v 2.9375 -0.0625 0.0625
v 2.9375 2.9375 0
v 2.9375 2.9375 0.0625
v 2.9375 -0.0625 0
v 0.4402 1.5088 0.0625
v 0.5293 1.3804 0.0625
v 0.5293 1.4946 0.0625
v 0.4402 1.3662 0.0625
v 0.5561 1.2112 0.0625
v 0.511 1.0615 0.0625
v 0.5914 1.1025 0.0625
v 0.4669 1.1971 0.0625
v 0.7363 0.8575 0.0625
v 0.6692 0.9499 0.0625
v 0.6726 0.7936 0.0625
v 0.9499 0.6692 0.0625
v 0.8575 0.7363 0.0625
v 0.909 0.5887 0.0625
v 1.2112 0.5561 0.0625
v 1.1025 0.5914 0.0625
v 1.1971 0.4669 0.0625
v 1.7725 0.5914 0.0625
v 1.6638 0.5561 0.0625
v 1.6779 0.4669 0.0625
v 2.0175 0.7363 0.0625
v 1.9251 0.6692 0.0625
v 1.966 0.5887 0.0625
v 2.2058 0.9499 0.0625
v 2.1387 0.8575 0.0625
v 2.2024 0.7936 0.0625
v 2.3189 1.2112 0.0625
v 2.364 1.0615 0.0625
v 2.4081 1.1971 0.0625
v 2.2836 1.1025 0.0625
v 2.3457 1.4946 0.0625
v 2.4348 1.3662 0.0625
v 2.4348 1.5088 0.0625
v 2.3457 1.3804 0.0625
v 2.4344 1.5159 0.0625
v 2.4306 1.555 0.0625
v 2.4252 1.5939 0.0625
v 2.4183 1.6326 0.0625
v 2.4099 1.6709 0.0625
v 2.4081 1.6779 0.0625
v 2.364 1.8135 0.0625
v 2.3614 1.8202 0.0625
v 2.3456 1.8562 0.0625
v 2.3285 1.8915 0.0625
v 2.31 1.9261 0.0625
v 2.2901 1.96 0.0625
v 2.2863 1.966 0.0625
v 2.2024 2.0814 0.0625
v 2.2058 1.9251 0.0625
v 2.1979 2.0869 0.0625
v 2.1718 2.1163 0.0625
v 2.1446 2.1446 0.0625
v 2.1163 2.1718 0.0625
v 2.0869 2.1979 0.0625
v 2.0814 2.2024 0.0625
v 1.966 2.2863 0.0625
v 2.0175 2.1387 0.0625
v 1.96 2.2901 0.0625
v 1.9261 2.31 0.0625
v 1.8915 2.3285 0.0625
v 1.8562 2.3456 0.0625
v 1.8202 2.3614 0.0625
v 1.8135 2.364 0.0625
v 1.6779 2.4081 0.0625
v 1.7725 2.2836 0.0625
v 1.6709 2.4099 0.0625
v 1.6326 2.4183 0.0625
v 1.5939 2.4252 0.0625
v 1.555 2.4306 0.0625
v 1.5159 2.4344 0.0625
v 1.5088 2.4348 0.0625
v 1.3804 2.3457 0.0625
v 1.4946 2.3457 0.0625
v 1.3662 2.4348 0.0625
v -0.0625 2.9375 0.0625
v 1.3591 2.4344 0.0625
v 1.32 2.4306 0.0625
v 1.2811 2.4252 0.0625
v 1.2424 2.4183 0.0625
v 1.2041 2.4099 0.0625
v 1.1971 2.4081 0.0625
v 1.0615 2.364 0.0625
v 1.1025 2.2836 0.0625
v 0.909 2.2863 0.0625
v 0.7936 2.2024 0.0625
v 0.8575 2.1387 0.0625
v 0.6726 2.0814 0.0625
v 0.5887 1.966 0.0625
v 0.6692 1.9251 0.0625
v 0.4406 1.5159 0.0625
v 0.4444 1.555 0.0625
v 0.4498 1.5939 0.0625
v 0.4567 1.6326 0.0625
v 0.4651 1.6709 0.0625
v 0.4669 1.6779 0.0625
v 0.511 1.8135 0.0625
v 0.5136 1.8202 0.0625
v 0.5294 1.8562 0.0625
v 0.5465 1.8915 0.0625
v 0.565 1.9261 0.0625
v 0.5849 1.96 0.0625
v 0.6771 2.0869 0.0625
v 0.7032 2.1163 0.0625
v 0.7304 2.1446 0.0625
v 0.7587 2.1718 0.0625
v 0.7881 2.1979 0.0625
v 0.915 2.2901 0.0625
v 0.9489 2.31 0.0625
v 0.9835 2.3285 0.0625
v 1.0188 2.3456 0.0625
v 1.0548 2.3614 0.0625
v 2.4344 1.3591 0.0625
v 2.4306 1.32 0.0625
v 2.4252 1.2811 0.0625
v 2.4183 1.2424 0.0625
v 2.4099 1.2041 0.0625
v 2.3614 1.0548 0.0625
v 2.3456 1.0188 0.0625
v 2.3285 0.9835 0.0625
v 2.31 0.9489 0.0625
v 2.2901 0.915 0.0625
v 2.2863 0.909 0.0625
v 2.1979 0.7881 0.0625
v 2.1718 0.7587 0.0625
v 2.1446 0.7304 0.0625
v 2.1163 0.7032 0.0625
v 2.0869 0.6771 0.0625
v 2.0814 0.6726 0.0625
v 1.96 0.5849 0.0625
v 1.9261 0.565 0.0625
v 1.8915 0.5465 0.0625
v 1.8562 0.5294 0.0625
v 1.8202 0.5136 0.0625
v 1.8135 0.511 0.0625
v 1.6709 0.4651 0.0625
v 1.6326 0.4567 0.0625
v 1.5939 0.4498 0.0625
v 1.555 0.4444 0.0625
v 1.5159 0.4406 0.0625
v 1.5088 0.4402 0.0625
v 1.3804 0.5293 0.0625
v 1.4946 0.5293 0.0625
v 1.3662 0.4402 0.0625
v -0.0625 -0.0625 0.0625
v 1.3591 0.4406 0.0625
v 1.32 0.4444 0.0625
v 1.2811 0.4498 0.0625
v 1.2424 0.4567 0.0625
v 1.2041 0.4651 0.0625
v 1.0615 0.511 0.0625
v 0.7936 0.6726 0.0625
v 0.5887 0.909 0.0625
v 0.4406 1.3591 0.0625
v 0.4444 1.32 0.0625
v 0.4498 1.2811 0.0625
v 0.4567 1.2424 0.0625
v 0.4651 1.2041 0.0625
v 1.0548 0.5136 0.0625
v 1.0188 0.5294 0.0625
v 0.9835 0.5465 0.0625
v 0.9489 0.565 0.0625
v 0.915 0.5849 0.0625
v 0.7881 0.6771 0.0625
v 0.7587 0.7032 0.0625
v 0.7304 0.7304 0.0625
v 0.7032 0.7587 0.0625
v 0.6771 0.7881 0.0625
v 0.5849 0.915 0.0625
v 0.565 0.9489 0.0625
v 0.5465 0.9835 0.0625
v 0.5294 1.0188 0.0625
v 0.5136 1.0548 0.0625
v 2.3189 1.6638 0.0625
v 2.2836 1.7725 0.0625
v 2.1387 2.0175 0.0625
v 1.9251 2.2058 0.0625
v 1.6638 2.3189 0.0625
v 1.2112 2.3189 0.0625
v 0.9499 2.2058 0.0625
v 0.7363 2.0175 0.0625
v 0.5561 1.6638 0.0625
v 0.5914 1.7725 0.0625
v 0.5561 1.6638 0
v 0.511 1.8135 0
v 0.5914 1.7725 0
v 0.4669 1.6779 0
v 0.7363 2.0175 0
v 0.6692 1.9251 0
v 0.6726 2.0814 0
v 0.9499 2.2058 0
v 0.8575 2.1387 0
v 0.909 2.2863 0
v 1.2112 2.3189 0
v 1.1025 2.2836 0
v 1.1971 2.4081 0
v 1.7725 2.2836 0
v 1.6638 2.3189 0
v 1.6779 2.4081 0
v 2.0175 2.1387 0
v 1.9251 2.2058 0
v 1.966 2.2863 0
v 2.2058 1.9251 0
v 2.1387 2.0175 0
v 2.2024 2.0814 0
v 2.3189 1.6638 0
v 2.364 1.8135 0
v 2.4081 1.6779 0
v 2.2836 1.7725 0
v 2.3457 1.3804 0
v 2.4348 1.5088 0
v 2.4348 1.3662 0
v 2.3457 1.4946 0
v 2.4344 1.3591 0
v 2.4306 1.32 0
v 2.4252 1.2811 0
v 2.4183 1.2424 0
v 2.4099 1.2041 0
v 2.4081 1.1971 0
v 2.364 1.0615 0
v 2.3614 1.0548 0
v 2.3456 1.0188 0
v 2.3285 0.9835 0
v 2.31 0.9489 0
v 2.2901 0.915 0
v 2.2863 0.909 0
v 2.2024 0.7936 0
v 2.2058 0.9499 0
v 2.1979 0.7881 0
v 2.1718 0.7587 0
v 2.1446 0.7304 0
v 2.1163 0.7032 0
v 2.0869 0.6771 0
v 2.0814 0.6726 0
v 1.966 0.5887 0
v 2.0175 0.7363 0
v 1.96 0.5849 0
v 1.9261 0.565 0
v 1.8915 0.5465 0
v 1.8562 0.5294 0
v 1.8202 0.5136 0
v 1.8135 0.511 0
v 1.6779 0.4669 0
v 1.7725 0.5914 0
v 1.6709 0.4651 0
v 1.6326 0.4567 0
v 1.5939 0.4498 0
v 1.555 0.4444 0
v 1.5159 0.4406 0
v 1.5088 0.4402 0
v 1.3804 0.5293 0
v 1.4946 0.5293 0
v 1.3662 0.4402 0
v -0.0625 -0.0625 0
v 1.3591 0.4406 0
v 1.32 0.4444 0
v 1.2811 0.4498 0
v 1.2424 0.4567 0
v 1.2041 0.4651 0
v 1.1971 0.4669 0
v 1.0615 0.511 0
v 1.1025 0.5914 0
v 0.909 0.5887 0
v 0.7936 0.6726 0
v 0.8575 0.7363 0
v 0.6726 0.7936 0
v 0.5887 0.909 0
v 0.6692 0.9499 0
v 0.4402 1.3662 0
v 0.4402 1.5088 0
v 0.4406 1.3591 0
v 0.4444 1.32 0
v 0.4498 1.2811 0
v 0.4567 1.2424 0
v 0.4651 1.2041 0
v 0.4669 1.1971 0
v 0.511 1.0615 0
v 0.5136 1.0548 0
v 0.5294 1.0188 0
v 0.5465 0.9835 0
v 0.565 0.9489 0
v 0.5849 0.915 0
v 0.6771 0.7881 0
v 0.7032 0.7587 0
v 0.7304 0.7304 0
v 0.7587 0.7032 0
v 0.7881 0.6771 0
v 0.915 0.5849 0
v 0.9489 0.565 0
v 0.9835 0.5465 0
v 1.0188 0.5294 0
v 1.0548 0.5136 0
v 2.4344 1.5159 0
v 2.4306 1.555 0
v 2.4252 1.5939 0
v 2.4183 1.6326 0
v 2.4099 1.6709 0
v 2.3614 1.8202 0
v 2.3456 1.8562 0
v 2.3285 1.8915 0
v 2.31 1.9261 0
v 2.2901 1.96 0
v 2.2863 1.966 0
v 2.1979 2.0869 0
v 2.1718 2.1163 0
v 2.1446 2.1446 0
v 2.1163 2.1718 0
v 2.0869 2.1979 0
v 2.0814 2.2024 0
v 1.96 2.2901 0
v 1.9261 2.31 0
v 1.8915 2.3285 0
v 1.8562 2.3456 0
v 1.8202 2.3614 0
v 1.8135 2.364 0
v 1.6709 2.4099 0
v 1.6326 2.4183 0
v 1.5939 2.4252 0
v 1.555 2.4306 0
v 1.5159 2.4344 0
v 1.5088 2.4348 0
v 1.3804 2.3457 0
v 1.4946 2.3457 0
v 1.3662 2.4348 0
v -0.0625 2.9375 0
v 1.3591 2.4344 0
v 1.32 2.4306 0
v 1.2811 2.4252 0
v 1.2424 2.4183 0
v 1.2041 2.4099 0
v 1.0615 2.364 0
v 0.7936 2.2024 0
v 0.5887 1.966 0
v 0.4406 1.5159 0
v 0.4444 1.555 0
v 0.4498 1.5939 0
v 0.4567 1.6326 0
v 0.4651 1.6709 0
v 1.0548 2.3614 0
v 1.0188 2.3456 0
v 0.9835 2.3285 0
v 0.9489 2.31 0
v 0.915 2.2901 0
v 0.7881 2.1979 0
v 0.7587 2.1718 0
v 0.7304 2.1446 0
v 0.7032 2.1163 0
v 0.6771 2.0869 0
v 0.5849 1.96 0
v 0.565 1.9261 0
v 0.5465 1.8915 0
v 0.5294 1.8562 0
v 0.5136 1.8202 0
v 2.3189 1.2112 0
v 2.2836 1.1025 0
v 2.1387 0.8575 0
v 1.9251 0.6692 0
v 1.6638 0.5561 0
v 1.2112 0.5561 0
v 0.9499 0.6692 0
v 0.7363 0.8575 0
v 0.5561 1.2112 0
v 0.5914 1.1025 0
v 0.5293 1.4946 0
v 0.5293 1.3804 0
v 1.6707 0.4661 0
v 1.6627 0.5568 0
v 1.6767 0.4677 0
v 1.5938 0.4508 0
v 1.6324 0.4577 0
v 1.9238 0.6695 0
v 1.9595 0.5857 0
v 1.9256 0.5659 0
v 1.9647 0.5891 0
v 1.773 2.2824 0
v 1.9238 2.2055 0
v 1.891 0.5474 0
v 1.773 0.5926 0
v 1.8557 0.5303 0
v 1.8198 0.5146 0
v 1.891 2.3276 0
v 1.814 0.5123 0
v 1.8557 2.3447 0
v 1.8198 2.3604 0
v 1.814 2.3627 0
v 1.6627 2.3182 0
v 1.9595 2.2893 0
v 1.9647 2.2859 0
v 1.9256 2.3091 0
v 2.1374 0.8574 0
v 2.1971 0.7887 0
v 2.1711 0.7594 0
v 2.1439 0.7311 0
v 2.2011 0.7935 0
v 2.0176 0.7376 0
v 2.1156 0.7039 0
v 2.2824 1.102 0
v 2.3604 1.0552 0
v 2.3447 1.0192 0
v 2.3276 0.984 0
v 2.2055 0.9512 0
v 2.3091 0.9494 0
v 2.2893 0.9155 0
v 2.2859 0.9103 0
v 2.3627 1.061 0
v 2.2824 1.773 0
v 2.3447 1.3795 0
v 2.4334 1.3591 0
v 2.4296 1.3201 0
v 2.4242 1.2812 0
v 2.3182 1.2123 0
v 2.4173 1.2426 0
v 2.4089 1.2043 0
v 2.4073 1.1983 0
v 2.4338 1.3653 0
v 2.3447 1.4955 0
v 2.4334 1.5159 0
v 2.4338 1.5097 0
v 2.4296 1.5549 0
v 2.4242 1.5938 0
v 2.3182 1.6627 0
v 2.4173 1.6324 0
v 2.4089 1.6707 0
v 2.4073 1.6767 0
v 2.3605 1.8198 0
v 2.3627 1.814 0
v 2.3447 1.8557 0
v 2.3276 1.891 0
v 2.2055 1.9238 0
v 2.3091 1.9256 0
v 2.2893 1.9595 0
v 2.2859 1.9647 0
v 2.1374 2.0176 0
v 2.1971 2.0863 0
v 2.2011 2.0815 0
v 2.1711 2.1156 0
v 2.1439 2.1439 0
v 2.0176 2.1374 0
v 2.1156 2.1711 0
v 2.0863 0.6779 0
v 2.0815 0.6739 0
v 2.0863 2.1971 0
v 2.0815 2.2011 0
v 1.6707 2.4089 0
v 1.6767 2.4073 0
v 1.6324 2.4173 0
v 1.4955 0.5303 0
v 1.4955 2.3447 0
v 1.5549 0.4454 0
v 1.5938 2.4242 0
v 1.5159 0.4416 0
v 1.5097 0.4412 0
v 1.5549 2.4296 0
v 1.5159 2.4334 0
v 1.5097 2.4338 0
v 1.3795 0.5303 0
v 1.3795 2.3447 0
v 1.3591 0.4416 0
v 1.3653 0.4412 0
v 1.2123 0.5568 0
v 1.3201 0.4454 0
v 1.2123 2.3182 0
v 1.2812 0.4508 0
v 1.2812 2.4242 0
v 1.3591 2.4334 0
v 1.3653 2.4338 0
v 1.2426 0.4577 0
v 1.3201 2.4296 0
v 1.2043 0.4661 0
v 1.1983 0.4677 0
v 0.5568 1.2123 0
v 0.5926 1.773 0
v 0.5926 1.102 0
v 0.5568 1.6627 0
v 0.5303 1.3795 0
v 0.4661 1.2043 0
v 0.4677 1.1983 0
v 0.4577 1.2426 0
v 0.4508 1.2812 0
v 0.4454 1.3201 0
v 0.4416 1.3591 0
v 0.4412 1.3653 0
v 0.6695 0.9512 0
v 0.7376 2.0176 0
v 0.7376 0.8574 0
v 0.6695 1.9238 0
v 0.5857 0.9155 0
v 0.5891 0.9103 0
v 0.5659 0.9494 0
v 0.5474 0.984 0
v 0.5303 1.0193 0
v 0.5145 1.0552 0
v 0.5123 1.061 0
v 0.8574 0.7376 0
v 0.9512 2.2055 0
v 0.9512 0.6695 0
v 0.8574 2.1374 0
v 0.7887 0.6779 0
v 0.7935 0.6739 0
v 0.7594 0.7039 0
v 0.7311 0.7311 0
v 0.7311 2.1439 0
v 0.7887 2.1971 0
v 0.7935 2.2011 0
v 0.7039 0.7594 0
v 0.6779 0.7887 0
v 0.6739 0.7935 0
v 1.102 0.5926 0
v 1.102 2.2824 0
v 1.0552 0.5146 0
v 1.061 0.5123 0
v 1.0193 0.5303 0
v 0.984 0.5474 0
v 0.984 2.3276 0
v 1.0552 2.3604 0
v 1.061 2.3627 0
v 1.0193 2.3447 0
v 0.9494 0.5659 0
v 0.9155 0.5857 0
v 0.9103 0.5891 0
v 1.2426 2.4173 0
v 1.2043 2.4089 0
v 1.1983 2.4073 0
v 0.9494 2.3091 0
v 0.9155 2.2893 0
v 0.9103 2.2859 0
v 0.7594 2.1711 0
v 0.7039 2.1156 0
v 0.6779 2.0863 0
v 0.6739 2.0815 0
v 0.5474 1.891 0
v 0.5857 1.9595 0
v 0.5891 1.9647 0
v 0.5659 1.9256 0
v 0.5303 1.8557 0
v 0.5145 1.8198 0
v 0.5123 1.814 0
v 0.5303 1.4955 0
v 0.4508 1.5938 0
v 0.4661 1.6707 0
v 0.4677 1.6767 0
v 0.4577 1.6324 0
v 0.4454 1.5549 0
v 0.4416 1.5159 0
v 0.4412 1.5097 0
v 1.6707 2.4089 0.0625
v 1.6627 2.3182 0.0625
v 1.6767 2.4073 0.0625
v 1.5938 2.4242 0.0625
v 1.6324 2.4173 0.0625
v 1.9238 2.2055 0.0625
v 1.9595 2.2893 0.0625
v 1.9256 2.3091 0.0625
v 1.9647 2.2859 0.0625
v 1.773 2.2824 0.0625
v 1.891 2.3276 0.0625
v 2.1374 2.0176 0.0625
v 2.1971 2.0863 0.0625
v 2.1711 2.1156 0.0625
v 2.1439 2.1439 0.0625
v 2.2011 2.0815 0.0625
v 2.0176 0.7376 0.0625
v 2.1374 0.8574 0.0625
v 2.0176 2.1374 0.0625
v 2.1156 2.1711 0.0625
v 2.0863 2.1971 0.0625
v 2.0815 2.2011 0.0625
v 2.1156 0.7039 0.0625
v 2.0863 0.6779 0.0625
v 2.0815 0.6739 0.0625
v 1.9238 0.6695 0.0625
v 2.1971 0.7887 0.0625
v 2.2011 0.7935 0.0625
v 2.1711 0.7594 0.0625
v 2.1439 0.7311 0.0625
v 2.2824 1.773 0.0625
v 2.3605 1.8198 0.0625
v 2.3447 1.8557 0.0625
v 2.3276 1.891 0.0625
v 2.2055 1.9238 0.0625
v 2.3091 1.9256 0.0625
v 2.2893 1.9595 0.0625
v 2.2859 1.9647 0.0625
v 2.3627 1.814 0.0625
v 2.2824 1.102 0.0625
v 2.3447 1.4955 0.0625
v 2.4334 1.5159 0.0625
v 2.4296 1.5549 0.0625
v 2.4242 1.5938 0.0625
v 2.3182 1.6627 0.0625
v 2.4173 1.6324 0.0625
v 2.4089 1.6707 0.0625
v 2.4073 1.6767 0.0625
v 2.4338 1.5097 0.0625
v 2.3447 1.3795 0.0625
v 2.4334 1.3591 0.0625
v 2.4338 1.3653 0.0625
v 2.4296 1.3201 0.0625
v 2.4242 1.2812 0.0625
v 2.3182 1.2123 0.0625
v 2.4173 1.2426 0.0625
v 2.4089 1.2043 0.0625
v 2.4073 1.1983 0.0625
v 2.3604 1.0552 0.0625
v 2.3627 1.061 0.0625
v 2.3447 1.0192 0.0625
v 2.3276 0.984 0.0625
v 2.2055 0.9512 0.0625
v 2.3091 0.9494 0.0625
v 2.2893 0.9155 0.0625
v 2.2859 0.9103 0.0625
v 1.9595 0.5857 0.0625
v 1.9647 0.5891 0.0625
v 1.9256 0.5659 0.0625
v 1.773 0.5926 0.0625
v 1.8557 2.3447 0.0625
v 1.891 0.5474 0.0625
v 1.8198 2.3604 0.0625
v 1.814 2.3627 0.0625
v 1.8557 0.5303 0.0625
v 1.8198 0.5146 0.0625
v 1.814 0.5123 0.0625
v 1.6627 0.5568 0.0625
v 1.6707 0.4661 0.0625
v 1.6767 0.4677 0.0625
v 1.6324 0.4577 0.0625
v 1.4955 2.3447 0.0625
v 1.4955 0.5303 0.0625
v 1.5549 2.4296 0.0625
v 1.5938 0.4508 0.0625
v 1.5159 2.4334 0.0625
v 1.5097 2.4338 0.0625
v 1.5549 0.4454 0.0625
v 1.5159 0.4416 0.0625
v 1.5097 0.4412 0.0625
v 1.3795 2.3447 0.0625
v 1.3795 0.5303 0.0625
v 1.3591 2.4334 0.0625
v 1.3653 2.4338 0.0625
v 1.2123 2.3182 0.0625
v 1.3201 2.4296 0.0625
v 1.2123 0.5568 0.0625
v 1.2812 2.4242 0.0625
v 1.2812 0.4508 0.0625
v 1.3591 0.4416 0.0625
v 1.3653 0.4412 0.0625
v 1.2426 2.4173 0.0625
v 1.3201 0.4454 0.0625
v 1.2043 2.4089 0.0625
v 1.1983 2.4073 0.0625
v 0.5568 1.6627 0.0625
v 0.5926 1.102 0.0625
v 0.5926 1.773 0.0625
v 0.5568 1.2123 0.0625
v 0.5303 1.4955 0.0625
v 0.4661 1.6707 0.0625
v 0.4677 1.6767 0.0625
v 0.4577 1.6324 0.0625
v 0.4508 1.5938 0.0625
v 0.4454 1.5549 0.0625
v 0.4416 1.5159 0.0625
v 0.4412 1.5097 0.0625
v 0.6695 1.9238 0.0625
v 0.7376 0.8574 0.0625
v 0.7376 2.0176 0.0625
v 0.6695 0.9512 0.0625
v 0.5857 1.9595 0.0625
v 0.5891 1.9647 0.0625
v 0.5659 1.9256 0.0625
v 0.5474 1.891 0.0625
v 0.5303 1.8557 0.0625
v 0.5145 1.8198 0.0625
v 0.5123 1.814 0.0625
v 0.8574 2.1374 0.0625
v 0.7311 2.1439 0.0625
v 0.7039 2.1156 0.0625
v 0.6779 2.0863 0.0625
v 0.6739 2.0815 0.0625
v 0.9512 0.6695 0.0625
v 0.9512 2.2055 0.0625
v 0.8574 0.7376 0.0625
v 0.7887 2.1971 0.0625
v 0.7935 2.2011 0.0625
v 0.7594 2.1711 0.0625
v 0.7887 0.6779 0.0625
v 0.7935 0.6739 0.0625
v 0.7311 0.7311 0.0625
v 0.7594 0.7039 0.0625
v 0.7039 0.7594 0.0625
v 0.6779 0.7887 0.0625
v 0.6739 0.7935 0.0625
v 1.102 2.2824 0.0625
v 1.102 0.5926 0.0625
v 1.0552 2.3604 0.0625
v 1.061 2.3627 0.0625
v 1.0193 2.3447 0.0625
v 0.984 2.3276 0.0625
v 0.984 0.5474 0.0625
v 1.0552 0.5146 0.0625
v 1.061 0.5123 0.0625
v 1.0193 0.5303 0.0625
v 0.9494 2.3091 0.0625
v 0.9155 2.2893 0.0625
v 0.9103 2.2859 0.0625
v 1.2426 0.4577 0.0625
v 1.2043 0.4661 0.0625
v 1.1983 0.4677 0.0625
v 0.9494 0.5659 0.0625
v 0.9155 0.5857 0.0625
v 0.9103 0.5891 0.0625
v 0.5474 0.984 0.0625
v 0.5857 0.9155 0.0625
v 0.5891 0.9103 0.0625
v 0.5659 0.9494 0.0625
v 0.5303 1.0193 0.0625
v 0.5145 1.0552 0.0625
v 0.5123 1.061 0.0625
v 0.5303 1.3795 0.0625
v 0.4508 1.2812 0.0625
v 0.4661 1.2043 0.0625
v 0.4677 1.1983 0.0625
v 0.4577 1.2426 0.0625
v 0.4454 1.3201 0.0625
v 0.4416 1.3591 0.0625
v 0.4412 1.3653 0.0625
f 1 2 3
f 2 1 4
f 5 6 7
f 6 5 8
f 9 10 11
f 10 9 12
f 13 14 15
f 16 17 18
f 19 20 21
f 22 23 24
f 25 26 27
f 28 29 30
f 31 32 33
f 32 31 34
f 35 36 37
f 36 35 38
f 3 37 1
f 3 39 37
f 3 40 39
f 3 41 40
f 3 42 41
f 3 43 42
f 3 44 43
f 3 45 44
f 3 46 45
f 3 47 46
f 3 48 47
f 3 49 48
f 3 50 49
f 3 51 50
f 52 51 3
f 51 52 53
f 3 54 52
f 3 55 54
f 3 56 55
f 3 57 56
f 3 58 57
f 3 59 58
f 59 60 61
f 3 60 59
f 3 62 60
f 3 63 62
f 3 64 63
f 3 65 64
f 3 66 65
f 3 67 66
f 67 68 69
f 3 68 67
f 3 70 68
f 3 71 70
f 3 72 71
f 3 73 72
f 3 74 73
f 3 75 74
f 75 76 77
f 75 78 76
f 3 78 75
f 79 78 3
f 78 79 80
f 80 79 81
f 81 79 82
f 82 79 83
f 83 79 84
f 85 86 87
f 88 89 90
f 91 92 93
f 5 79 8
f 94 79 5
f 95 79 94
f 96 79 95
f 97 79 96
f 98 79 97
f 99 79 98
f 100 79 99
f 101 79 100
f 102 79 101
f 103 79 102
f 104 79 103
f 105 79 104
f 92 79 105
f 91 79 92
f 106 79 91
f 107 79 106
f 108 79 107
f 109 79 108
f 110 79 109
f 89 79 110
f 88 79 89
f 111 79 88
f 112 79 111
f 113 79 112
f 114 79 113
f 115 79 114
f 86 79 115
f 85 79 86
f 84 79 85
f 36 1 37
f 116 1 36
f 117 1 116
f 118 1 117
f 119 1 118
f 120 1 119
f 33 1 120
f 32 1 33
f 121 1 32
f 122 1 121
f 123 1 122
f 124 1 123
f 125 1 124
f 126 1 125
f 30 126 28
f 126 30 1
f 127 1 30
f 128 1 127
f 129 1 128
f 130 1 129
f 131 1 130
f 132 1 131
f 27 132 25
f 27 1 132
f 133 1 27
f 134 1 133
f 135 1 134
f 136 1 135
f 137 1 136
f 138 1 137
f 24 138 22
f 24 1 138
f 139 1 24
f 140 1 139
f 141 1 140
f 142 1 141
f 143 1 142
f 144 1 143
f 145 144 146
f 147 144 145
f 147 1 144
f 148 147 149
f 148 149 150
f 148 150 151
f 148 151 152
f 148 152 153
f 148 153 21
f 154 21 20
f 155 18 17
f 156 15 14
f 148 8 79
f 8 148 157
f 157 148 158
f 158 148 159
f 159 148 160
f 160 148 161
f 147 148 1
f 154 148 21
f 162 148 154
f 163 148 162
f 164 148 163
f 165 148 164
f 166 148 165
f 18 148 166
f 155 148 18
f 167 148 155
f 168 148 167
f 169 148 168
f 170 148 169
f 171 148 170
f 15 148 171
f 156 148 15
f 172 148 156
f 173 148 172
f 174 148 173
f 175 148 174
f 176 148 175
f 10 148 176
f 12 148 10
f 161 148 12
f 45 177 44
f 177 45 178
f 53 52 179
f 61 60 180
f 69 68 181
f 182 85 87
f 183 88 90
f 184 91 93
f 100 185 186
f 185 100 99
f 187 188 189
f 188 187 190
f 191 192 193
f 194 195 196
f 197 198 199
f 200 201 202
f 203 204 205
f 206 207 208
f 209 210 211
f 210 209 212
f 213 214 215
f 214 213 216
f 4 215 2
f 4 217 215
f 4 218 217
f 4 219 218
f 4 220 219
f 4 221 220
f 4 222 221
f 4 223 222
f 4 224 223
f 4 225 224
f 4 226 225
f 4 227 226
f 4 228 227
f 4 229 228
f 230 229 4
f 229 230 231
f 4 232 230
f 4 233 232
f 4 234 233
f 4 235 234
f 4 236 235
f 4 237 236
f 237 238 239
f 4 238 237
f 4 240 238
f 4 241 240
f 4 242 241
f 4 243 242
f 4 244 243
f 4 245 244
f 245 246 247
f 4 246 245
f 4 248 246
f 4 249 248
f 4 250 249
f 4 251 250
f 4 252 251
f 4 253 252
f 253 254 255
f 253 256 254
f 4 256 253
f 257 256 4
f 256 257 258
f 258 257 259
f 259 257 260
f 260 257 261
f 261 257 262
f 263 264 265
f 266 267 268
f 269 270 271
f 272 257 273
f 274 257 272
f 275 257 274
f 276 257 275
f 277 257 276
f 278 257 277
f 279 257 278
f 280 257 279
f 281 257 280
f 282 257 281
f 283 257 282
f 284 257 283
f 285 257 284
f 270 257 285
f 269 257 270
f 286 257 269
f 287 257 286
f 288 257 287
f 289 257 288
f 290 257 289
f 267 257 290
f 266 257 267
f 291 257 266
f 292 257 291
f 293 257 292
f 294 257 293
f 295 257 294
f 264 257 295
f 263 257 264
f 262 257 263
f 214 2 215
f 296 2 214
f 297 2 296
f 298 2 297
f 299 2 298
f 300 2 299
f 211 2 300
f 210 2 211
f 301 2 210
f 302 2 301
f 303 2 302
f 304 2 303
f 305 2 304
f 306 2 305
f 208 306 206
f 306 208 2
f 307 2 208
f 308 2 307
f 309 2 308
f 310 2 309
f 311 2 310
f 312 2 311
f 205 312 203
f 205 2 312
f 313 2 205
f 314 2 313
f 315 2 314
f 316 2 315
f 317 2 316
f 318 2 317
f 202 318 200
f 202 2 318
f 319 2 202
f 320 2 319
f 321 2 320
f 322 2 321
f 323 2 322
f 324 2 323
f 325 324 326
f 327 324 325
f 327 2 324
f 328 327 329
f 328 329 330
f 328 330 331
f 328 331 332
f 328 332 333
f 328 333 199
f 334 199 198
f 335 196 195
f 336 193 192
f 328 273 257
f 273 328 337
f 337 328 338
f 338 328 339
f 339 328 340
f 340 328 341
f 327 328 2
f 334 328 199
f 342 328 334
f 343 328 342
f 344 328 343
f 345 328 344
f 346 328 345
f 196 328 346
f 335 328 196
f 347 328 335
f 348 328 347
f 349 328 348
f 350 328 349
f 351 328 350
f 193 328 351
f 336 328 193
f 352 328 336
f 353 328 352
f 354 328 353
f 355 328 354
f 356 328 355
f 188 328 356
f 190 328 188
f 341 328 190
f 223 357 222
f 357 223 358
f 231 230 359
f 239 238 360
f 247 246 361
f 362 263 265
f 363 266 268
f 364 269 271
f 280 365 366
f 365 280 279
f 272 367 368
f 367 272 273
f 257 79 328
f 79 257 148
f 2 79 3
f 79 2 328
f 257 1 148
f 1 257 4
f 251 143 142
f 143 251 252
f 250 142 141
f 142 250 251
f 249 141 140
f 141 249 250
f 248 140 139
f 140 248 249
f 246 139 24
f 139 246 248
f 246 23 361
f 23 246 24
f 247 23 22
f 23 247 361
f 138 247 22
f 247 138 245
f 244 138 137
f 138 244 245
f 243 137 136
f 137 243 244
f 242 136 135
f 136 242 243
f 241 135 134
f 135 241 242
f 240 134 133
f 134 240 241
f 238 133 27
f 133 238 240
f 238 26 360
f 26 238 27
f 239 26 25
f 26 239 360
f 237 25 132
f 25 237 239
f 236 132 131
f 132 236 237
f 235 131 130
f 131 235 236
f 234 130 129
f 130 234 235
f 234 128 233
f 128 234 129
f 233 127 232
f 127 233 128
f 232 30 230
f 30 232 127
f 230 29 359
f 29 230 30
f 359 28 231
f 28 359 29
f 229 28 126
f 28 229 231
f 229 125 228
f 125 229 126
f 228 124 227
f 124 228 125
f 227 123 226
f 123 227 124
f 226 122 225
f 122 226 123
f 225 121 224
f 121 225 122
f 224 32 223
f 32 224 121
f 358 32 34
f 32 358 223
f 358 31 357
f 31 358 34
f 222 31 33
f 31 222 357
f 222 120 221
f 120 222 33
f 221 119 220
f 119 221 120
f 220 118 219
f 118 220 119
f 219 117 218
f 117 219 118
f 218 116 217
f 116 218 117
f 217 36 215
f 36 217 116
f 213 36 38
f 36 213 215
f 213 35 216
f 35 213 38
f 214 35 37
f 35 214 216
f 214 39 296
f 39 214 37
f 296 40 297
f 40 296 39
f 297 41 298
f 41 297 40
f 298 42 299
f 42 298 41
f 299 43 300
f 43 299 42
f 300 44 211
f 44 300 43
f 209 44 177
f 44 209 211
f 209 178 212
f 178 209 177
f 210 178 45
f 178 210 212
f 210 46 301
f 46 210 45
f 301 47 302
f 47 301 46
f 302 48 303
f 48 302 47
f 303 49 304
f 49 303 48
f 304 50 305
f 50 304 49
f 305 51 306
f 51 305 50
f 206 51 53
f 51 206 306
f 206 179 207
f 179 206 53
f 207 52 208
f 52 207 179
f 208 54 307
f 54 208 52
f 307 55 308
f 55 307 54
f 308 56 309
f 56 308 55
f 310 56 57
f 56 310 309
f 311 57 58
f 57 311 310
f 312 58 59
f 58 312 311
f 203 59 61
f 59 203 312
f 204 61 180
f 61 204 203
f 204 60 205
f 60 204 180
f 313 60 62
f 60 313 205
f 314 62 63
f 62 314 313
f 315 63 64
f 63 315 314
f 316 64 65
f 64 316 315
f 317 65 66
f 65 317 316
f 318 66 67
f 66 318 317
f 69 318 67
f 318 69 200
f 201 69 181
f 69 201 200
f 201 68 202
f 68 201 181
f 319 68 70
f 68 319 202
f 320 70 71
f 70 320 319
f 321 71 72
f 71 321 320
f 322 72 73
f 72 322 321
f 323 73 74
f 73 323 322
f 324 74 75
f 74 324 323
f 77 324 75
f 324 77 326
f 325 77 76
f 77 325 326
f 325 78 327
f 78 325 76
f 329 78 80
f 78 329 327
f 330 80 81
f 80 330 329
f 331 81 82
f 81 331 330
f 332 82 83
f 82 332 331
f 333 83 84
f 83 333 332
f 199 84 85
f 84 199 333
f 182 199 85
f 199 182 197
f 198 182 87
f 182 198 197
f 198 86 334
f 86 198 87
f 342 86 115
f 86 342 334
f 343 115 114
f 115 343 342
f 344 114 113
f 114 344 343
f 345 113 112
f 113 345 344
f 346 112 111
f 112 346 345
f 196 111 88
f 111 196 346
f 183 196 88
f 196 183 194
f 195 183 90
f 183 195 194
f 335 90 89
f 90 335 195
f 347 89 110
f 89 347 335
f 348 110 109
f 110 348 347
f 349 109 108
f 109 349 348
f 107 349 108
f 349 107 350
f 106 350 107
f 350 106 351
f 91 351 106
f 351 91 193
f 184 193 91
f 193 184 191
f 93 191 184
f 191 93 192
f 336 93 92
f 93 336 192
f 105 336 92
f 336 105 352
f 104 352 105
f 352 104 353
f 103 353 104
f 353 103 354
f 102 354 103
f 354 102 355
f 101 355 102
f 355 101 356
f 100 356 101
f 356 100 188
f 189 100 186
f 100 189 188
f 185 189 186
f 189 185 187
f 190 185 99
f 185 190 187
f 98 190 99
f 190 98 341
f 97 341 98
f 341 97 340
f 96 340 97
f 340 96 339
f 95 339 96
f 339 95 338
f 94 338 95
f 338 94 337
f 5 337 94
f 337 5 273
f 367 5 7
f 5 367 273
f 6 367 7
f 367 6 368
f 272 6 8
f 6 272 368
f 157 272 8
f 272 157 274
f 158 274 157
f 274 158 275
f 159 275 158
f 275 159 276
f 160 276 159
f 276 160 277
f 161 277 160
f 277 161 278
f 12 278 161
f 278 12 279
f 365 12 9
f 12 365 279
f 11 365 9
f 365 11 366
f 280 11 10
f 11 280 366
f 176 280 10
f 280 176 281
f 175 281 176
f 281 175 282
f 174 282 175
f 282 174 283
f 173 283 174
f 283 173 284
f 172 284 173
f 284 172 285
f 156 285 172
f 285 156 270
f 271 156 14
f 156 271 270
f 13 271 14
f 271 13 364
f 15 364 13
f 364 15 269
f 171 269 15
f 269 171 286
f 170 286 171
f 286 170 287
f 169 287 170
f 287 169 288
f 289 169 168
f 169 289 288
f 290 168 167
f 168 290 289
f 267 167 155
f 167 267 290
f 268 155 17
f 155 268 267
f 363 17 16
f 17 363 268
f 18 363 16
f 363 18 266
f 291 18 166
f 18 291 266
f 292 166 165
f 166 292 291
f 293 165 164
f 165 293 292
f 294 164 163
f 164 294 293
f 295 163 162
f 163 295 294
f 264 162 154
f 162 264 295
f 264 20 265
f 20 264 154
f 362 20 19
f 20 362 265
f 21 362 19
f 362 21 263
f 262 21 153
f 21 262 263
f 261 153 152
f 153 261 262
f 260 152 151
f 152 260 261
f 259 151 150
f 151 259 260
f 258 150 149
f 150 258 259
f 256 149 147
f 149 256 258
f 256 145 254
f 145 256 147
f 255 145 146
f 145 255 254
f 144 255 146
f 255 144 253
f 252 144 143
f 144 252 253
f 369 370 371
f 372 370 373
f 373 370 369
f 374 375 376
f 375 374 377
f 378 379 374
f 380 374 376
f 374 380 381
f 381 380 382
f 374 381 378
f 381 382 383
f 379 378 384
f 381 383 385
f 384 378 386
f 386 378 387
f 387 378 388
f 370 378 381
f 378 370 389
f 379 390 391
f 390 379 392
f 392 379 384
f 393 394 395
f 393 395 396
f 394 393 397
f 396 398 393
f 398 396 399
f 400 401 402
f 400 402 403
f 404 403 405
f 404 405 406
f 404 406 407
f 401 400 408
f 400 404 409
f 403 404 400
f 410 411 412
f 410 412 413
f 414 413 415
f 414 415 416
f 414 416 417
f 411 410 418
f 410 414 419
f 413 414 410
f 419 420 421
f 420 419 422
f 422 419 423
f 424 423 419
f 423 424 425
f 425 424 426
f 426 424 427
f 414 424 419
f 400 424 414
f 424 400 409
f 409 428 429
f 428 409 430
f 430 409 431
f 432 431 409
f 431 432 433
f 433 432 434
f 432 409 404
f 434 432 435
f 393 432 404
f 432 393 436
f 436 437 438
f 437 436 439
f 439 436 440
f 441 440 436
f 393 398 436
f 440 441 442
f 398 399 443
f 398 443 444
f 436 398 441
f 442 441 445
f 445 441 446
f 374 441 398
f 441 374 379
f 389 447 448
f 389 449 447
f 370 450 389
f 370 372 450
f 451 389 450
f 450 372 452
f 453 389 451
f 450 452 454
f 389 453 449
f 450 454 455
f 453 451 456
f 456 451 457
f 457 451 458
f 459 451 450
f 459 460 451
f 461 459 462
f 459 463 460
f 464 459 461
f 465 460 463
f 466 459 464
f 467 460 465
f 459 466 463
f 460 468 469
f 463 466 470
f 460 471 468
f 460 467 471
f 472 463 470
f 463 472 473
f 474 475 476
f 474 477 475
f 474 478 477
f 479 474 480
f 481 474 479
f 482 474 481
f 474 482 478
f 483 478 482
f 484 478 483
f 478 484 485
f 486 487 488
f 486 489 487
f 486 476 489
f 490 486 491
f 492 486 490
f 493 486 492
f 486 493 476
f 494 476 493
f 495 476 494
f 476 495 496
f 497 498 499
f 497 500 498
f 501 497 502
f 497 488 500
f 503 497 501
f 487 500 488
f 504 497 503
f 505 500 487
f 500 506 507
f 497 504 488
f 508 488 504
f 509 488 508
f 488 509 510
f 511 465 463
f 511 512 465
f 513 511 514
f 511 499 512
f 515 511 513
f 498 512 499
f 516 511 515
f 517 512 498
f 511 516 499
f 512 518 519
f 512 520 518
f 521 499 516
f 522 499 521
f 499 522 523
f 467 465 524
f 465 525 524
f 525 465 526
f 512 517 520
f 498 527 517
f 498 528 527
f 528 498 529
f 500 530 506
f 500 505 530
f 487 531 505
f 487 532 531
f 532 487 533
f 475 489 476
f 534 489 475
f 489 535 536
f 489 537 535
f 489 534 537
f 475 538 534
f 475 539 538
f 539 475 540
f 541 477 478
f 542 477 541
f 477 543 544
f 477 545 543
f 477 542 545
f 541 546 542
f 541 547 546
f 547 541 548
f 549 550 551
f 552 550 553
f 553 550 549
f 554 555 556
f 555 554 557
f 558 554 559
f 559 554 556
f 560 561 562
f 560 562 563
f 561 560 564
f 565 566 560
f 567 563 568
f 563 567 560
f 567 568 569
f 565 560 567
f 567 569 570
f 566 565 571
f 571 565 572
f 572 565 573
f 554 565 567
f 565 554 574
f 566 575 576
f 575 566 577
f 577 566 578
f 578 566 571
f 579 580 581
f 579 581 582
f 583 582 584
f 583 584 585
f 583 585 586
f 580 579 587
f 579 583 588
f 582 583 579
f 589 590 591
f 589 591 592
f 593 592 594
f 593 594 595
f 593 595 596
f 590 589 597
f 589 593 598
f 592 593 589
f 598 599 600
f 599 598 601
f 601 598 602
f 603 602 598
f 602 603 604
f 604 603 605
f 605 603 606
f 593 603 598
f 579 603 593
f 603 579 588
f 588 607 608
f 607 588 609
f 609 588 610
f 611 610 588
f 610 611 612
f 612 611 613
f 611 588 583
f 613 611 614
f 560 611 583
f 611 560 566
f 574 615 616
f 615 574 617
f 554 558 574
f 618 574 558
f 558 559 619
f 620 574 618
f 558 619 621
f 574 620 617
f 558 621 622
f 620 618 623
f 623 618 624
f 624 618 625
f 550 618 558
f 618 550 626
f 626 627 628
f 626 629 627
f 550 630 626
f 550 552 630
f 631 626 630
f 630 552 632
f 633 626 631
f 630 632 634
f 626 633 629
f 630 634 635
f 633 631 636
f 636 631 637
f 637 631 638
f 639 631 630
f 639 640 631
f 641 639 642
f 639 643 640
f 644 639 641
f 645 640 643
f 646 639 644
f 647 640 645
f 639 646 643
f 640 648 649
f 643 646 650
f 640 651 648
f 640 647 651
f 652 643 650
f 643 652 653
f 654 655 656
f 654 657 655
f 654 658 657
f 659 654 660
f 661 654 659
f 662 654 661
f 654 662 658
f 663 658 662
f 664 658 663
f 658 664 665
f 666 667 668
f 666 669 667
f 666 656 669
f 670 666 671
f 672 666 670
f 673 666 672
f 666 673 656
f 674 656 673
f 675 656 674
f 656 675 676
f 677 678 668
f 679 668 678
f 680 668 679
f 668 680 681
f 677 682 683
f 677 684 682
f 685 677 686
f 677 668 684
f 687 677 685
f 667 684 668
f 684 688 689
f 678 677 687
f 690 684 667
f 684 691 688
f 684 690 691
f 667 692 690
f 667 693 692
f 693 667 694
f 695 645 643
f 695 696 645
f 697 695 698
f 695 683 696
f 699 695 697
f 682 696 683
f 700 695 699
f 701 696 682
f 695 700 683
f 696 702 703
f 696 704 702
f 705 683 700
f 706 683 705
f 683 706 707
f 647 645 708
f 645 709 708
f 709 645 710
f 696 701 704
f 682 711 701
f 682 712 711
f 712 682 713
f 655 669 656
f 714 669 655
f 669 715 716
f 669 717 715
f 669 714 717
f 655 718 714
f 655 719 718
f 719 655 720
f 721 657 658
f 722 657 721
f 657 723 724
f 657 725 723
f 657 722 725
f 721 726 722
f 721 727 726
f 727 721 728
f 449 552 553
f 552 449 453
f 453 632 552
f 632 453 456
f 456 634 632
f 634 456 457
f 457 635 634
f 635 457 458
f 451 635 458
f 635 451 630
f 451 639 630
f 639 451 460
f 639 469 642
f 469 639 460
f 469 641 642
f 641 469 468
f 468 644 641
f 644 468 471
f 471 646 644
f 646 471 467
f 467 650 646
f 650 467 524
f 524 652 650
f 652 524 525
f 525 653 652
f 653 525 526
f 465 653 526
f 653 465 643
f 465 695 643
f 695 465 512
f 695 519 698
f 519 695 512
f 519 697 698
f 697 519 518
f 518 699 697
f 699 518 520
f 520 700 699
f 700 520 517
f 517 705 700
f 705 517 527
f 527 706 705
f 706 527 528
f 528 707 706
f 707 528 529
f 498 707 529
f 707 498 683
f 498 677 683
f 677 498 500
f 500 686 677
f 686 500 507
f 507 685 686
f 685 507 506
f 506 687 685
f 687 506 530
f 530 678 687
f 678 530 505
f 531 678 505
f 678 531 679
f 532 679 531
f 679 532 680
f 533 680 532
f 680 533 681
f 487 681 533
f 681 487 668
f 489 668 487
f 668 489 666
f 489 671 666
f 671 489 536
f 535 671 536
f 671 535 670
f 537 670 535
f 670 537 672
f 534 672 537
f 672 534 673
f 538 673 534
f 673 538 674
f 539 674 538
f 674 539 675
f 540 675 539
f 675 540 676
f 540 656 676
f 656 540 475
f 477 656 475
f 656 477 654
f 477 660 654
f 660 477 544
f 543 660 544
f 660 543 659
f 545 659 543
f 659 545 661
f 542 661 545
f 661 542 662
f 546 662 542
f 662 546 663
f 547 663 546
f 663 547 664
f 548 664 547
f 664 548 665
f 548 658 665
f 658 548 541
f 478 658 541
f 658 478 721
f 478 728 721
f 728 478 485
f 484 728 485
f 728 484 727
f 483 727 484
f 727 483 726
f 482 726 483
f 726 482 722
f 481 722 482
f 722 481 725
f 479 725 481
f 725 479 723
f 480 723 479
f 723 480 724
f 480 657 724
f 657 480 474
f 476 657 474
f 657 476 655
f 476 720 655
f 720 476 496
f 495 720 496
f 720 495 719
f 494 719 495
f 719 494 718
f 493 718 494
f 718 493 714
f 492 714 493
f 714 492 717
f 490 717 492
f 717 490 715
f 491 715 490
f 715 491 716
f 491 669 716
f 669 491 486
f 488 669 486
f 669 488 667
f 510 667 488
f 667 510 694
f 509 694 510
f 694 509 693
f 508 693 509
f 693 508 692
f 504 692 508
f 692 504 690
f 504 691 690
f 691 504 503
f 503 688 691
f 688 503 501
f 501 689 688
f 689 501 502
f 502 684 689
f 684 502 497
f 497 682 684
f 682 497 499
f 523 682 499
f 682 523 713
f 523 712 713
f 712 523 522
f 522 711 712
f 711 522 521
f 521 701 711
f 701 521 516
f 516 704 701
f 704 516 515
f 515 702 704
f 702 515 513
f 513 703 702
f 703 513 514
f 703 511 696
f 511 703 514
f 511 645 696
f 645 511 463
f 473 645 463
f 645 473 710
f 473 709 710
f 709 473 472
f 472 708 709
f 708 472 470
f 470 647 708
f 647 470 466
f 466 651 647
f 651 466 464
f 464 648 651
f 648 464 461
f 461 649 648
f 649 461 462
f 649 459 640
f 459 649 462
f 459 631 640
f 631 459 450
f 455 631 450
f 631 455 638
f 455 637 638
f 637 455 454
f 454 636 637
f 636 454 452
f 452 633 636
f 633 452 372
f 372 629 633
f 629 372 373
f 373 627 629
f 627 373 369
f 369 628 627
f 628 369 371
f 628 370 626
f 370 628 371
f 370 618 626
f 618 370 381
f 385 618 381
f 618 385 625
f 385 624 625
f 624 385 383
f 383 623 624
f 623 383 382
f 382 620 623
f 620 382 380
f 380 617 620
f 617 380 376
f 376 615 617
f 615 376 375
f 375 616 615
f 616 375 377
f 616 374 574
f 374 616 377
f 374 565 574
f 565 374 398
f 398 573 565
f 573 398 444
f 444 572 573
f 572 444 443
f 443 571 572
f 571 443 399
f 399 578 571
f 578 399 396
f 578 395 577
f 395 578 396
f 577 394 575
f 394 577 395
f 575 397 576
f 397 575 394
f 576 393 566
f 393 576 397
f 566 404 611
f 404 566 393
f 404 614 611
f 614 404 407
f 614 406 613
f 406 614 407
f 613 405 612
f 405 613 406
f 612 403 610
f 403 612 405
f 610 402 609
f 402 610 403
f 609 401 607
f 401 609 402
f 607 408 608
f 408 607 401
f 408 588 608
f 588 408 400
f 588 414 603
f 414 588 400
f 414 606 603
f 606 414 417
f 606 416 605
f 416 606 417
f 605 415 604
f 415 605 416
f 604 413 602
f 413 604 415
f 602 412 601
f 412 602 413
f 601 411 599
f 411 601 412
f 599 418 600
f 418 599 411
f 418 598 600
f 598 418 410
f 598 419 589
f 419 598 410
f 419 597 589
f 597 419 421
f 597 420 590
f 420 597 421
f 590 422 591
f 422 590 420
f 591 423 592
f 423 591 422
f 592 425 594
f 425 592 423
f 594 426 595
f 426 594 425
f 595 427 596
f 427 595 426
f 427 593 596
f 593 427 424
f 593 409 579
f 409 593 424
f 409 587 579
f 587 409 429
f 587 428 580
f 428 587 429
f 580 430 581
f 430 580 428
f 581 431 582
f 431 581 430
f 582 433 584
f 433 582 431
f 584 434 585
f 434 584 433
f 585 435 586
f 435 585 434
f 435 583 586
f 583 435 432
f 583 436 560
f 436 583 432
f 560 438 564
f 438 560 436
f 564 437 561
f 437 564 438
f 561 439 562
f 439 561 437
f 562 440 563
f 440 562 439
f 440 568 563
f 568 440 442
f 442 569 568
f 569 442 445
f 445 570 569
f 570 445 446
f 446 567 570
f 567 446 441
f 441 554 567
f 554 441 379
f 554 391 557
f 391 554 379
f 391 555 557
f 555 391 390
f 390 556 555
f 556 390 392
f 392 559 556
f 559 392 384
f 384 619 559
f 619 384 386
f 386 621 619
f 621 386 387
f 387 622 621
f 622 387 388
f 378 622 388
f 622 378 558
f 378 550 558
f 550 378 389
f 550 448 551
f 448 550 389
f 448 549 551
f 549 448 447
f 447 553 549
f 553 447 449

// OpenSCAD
// file: sub_innergears.scad
// sub_innergears.scad — shared inner gear ring (ring with inward-pointing teeth)
// Requires caller to define: plate_w, plate_d, plate_h (see sub_base_plate.scad)
// Units: inches
//
// Usage — must be `include`, positioned after sub_base_plate.scad and before any
// code that references gear_r_tip/gear_r_root/gear_r_bore:
//   include <sub_base_plate.scad>
//   include <sub_innergears.scad>
//   gear("darkred");
//   gear_bore("lightgray");
//
// gear(c) and gear_bore(c) take a color string so tiles with different gear
// colors (e.g. darkred vs darkgreen) can share this same file.

gear_r_tip  = 1.18;   // outer edge of ring (plain)
gear_r_root = 1.00;   // ring inner edge; teeth root here
gear_r_bore = 0.82;   // bore radius / tooth tip depth
gear_n      = 20;
tooth_hw    = 4.5;
tooth_tip_f = 0.80;

// ── Gear 2D helpers ───────────────────────────────────────────────────────────

module gear_tooth_2d() {
    shift   = (gear_r_root - gear_r_bore) / 2;
    r_outer = gear_r_root + shift;
    r_inner = gear_r_bore + shift;
    polygon([
        [r_outer * cos(-tooth_hw),               r_outer * sin(-tooth_hw)],
        [r_inner * cos(-tooth_hw * tooth_tip_f),  r_inner * sin(-tooth_hw * tooth_tip_f)],
        [r_inner * cos( tooth_hw * tooth_tip_f),  r_inner * sin( tooth_hw * tooth_tip_f)],
        [r_outer * cos( tooth_hw),               r_outer * sin( tooth_hw)],
    ]);
}

module gear_2d() {
    circle(r = gear_r_tip, $fn = 160);
}

module bore_2d() {
    pitch = 360 / gear_n;
    difference() {
        circle(r = gear_r_root, $fn = 160);
        for (i = [0:gear_n - 1]) rotate([0, 0, i * pitch]) gear_tooth_2d();
    }
}

// ── Gear holes & gear ────────────────────────────────────────────────────────

module gear_holes() {
    translate([plate_w / 2, plate_d / 2, -1])
    linear_extrude(plate_h + 2)
    difference() {
        gear_2d();
        bore_2d();
    }
}

module gear(c) {
    color(c)
    translate([plate_w / 2, plate_d / 2, 0])
    linear_extrude(plate_h)
    difference() { gear_2d(); bore_2d(); }
}

// ── Gear bore hole & gear bore ────────────────────────────────────────────────

module gear_bore_holes() {
    translate([plate_w / 2, plate_d / 2, -1])
    linear_extrude(plate_h + 2)
    bore_2d();
}

module gear_bore(c) {
    color(c)
    translate([plate_w / 2, plate_d / 2, 0])
    linear_extrude(plate_h)
    offset(delta = -0.001) bore_2d();
}
// file: sub_base_plate.scad
// sub_base_plate.scad — shared tile-building blocks: plate, rivets, edge ID marks,
// and the common plate/hole dimensional constants used by every tile.
// Units: inches
//
// Usage — must be `include`, not `use`, and the include line must come
// before any code in the caller that references plate_w/plate_d/plate_h/
// frame_w/hole_d/hole_r: a variable defined only inside an included file is
// invisible to code positioned before the include statement.
//   include <sub_base_plate.scad>
//   plate(["red", undef, "blue", undef, undef, "green"]);
//
// plate(colors) is the main entry point: it builds the complete base tile in
// one call — the frame with edge ID marks, the darkgray plate, and the
// lightgray rivet ring (40 rivets, 10 per side, corners shared). colors is the
// same 6-slot frame_with_id() array described below.
//
// frame_with_id() colors are applied left-to-right (−x to +x), repeated
// identically on all four edges. Bottom and right edges read the array in
// reverse (slot 5-i) so the pattern stays consistent when the tile is flipped.
// Any position left as undef or omitted defaults to black. 6 regions span the
// straight run of each edge (corners always stay solid black). A thin black
// layer covers the marks on the top face; marks are visible from the edge.

plate_w = 2 + 7/8;
plate_d = 2 + 7/8;
plate_h = 1/16;
frame_w = 1/16;
hole_d  = 3/32;
hole_r  = hole_d / 2;

module rivet_holes() {
    spacing_x = plate_w / 10;
    spacing_y = plate_d / 10;
    inset_x   = spacing_x / 2;
    inset_y   = spacing_y / 2;
    for (i = [0:9]) translate([inset_x + i * spacing_x, inset_y,           -1]) cylinder(h = plate_h + 2, r = hole_r, $fn = 20);
    for (i = [0:9]) translate([inset_x + i * spacing_x, plate_d - inset_y, -1]) cylinder(h = plate_h + 2, r = hole_r, $fn = 20);
    for (i = [0:9]) translate([inset_x,           inset_y + i * spacing_y, -1]) cylinder(h = plate_h + 2, r = hole_r, $fn = 20);
    for (i = [0:9]) translate([plate_w - inset_x, inset_y + i * spacing_y, -1]) cylinder(h = plate_h + 2, r = hole_r, $fn = 20);
}

module rivets() {
    spacing_x = plate_w / 10;
    spacing_y = plate_d / 10;
    inset_x   = spacing_x / 2;
    inset_y   = spacing_y / 2;
    color("lightgray") {
        for (i = [0:9]) translate([inset_x + i * spacing_x, inset_y,           0]) cylinder(h = plate_h, r = hole_r, $fn = 20);
        for (i = [0:9]) translate([inset_x + i * spacing_x, plate_d - inset_y, 0]) cylinder(h = plate_h, r = hole_r, $fn = 20);
        for (i = [0:9]) translate([inset_x,           inset_y + i * spacing_y, 0]) cylinder(h = plate_h, r = hole_r, $fn = 20);
        for (i = [0:9]) translate([plate_w - inset_x, inset_y + i * spacing_y, 0]) cylinder(h = plate_h, r = hole_r, $fn = 20);
    }
}

module frame_with_id(colors = []) {
    id_cover = plate_h / 8;
    region_w = plate_w / 6;
    region_d = plate_d / 6;
    mark_h   = plate_h - id_cover;

    color("black")
    difference() {
        translate([-frame_w, -frame_w, 0])
            cube([plate_w + 2 * frame_w, plate_d + 2 * frame_w, plate_h]);
        translate([0, 0, -0.001])
            cube([plate_w, plate_d, plate_h + 0.002]);
        // top/bottom/left/right straight runs only — corners stay solid black
        translate([0, plate_d - 0.001, -0.001])
            cube([plate_w, frame_w + 0.002, plate_h + 0.002]);
        translate([0, -frame_w - 0.001, -0.001])
            cube([plate_w, frame_w + 0.002, plate_h + 0.002]);
        translate([-frame_w - 0.001, 0, -0.001])
            cube([frame_w + 0.002, plate_d, plate_h + 0.002]);
        translate([plate_w - 0.001, 0, -0.001])
            cube([frame_w + 0.002, plate_d, plate_h + 0.002]);
    }

    for (i = [0:5]) {
        c     = (colors[i] != undef) ? colors[i] : "black";

        // top edge
        color(c) translate([i * region_w, plate_d, 0]) cube([region_w, frame_w, mark_h]);
        color("black") translate([i * region_w, plate_d, mark_h]) cube([region_w, frame_w, id_cover]);

        // bottom edge (reversed)
        color(c) translate([(5-i) * region_w, -frame_w, 0]) cube([region_w, frame_w, mark_h]);
        color("black") translate([(5-i) * region_w, -frame_w, mark_h]) cube([region_w, frame_w, id_cover]);

        // left edge
        color(c) translate([-frame_w, i * region_d, 0]) cube([frame_w, region_d, mark_h]);
        color("black") translate([-frame_w, i * region_d, mark_h]) cube([frame_w, region_d, id_cover]);

        // right edge (reversed)
        color(c) translate([plate_w, (5-i) * region_d, 0]) cube([frame_w, region_d, mark_h]);
        color("black") translate([plate_w, (5-i) * region_d, mark_h]) cube([frame_w, region_d, id_cover]);
    }
}

module plate(colors = []) {
    frame_with_id(colors);
    union() {
        difference() {
            color("darkgray") cube([plate_w, plate_d, plate_h]);
            rivet_holes();
        }
        rivets();
    }
}
// file: sub_element110.scad
// sub_element110.scad — shared assembly for element110 gear tile variants
// Requires caller to define: plate_colors (6-slot frame color array),
// label_num (digit painted in the gear bore)
// Units: inches

include <sub_base_plate.scad>
include <sub_innergears.scad>

// ── Label hole → label ────────────────────────────────────────────────────────

module label_holes(num) {
    translate([plate_w / 2, plate_d / 2, -0.001])
    linear_extrude(plate_h + 0.002)
    text(str(num), size = 1.1, halign = "center", valign = "center",
         font = "Liberation Sans:style=Bold");
}

module label(num, clr) {
    color(clr)
    translate([plate_w / 2, plate_d / 2, 0])
    linear_extrude(plate_h)
    text(str(num), size = 1.1, halign = "center", valign = "center",
         font = "Liberation Sans:style=Bold");
}

// ── Assembly ──────────────────────────────────────────────────────────────────
// Each level: difference() cuts the holes INTO the running assembly,
//             union() then adds the feature that fills those holes.
// Innermost = first step; outermost = last step.

union() {                                           // step 4: add label
    difference() {
        union() {                                   // step 3: add gear bore
            difference() {
                union() {                           // step 2: add gear
                    difference() {
                        plate(plate_colors);   // step 1: plate (frame + rivets)
                        gear_holes();
                    }
                    gear("darkgreen");
                }
                gear_bore_holes();
            }
            gear_bore("lightgray");
        }
        label_holes(label_num);
    }
    label(label_num, "green");
}
// main file
// element110-4.scad
// Gear tile variant — number "4" in the bore.
// Units: inches

plate_colors = ["green", "green", "green", undef, "green", "green"];
label_num    = 4;

include <sub_element110.scad>
